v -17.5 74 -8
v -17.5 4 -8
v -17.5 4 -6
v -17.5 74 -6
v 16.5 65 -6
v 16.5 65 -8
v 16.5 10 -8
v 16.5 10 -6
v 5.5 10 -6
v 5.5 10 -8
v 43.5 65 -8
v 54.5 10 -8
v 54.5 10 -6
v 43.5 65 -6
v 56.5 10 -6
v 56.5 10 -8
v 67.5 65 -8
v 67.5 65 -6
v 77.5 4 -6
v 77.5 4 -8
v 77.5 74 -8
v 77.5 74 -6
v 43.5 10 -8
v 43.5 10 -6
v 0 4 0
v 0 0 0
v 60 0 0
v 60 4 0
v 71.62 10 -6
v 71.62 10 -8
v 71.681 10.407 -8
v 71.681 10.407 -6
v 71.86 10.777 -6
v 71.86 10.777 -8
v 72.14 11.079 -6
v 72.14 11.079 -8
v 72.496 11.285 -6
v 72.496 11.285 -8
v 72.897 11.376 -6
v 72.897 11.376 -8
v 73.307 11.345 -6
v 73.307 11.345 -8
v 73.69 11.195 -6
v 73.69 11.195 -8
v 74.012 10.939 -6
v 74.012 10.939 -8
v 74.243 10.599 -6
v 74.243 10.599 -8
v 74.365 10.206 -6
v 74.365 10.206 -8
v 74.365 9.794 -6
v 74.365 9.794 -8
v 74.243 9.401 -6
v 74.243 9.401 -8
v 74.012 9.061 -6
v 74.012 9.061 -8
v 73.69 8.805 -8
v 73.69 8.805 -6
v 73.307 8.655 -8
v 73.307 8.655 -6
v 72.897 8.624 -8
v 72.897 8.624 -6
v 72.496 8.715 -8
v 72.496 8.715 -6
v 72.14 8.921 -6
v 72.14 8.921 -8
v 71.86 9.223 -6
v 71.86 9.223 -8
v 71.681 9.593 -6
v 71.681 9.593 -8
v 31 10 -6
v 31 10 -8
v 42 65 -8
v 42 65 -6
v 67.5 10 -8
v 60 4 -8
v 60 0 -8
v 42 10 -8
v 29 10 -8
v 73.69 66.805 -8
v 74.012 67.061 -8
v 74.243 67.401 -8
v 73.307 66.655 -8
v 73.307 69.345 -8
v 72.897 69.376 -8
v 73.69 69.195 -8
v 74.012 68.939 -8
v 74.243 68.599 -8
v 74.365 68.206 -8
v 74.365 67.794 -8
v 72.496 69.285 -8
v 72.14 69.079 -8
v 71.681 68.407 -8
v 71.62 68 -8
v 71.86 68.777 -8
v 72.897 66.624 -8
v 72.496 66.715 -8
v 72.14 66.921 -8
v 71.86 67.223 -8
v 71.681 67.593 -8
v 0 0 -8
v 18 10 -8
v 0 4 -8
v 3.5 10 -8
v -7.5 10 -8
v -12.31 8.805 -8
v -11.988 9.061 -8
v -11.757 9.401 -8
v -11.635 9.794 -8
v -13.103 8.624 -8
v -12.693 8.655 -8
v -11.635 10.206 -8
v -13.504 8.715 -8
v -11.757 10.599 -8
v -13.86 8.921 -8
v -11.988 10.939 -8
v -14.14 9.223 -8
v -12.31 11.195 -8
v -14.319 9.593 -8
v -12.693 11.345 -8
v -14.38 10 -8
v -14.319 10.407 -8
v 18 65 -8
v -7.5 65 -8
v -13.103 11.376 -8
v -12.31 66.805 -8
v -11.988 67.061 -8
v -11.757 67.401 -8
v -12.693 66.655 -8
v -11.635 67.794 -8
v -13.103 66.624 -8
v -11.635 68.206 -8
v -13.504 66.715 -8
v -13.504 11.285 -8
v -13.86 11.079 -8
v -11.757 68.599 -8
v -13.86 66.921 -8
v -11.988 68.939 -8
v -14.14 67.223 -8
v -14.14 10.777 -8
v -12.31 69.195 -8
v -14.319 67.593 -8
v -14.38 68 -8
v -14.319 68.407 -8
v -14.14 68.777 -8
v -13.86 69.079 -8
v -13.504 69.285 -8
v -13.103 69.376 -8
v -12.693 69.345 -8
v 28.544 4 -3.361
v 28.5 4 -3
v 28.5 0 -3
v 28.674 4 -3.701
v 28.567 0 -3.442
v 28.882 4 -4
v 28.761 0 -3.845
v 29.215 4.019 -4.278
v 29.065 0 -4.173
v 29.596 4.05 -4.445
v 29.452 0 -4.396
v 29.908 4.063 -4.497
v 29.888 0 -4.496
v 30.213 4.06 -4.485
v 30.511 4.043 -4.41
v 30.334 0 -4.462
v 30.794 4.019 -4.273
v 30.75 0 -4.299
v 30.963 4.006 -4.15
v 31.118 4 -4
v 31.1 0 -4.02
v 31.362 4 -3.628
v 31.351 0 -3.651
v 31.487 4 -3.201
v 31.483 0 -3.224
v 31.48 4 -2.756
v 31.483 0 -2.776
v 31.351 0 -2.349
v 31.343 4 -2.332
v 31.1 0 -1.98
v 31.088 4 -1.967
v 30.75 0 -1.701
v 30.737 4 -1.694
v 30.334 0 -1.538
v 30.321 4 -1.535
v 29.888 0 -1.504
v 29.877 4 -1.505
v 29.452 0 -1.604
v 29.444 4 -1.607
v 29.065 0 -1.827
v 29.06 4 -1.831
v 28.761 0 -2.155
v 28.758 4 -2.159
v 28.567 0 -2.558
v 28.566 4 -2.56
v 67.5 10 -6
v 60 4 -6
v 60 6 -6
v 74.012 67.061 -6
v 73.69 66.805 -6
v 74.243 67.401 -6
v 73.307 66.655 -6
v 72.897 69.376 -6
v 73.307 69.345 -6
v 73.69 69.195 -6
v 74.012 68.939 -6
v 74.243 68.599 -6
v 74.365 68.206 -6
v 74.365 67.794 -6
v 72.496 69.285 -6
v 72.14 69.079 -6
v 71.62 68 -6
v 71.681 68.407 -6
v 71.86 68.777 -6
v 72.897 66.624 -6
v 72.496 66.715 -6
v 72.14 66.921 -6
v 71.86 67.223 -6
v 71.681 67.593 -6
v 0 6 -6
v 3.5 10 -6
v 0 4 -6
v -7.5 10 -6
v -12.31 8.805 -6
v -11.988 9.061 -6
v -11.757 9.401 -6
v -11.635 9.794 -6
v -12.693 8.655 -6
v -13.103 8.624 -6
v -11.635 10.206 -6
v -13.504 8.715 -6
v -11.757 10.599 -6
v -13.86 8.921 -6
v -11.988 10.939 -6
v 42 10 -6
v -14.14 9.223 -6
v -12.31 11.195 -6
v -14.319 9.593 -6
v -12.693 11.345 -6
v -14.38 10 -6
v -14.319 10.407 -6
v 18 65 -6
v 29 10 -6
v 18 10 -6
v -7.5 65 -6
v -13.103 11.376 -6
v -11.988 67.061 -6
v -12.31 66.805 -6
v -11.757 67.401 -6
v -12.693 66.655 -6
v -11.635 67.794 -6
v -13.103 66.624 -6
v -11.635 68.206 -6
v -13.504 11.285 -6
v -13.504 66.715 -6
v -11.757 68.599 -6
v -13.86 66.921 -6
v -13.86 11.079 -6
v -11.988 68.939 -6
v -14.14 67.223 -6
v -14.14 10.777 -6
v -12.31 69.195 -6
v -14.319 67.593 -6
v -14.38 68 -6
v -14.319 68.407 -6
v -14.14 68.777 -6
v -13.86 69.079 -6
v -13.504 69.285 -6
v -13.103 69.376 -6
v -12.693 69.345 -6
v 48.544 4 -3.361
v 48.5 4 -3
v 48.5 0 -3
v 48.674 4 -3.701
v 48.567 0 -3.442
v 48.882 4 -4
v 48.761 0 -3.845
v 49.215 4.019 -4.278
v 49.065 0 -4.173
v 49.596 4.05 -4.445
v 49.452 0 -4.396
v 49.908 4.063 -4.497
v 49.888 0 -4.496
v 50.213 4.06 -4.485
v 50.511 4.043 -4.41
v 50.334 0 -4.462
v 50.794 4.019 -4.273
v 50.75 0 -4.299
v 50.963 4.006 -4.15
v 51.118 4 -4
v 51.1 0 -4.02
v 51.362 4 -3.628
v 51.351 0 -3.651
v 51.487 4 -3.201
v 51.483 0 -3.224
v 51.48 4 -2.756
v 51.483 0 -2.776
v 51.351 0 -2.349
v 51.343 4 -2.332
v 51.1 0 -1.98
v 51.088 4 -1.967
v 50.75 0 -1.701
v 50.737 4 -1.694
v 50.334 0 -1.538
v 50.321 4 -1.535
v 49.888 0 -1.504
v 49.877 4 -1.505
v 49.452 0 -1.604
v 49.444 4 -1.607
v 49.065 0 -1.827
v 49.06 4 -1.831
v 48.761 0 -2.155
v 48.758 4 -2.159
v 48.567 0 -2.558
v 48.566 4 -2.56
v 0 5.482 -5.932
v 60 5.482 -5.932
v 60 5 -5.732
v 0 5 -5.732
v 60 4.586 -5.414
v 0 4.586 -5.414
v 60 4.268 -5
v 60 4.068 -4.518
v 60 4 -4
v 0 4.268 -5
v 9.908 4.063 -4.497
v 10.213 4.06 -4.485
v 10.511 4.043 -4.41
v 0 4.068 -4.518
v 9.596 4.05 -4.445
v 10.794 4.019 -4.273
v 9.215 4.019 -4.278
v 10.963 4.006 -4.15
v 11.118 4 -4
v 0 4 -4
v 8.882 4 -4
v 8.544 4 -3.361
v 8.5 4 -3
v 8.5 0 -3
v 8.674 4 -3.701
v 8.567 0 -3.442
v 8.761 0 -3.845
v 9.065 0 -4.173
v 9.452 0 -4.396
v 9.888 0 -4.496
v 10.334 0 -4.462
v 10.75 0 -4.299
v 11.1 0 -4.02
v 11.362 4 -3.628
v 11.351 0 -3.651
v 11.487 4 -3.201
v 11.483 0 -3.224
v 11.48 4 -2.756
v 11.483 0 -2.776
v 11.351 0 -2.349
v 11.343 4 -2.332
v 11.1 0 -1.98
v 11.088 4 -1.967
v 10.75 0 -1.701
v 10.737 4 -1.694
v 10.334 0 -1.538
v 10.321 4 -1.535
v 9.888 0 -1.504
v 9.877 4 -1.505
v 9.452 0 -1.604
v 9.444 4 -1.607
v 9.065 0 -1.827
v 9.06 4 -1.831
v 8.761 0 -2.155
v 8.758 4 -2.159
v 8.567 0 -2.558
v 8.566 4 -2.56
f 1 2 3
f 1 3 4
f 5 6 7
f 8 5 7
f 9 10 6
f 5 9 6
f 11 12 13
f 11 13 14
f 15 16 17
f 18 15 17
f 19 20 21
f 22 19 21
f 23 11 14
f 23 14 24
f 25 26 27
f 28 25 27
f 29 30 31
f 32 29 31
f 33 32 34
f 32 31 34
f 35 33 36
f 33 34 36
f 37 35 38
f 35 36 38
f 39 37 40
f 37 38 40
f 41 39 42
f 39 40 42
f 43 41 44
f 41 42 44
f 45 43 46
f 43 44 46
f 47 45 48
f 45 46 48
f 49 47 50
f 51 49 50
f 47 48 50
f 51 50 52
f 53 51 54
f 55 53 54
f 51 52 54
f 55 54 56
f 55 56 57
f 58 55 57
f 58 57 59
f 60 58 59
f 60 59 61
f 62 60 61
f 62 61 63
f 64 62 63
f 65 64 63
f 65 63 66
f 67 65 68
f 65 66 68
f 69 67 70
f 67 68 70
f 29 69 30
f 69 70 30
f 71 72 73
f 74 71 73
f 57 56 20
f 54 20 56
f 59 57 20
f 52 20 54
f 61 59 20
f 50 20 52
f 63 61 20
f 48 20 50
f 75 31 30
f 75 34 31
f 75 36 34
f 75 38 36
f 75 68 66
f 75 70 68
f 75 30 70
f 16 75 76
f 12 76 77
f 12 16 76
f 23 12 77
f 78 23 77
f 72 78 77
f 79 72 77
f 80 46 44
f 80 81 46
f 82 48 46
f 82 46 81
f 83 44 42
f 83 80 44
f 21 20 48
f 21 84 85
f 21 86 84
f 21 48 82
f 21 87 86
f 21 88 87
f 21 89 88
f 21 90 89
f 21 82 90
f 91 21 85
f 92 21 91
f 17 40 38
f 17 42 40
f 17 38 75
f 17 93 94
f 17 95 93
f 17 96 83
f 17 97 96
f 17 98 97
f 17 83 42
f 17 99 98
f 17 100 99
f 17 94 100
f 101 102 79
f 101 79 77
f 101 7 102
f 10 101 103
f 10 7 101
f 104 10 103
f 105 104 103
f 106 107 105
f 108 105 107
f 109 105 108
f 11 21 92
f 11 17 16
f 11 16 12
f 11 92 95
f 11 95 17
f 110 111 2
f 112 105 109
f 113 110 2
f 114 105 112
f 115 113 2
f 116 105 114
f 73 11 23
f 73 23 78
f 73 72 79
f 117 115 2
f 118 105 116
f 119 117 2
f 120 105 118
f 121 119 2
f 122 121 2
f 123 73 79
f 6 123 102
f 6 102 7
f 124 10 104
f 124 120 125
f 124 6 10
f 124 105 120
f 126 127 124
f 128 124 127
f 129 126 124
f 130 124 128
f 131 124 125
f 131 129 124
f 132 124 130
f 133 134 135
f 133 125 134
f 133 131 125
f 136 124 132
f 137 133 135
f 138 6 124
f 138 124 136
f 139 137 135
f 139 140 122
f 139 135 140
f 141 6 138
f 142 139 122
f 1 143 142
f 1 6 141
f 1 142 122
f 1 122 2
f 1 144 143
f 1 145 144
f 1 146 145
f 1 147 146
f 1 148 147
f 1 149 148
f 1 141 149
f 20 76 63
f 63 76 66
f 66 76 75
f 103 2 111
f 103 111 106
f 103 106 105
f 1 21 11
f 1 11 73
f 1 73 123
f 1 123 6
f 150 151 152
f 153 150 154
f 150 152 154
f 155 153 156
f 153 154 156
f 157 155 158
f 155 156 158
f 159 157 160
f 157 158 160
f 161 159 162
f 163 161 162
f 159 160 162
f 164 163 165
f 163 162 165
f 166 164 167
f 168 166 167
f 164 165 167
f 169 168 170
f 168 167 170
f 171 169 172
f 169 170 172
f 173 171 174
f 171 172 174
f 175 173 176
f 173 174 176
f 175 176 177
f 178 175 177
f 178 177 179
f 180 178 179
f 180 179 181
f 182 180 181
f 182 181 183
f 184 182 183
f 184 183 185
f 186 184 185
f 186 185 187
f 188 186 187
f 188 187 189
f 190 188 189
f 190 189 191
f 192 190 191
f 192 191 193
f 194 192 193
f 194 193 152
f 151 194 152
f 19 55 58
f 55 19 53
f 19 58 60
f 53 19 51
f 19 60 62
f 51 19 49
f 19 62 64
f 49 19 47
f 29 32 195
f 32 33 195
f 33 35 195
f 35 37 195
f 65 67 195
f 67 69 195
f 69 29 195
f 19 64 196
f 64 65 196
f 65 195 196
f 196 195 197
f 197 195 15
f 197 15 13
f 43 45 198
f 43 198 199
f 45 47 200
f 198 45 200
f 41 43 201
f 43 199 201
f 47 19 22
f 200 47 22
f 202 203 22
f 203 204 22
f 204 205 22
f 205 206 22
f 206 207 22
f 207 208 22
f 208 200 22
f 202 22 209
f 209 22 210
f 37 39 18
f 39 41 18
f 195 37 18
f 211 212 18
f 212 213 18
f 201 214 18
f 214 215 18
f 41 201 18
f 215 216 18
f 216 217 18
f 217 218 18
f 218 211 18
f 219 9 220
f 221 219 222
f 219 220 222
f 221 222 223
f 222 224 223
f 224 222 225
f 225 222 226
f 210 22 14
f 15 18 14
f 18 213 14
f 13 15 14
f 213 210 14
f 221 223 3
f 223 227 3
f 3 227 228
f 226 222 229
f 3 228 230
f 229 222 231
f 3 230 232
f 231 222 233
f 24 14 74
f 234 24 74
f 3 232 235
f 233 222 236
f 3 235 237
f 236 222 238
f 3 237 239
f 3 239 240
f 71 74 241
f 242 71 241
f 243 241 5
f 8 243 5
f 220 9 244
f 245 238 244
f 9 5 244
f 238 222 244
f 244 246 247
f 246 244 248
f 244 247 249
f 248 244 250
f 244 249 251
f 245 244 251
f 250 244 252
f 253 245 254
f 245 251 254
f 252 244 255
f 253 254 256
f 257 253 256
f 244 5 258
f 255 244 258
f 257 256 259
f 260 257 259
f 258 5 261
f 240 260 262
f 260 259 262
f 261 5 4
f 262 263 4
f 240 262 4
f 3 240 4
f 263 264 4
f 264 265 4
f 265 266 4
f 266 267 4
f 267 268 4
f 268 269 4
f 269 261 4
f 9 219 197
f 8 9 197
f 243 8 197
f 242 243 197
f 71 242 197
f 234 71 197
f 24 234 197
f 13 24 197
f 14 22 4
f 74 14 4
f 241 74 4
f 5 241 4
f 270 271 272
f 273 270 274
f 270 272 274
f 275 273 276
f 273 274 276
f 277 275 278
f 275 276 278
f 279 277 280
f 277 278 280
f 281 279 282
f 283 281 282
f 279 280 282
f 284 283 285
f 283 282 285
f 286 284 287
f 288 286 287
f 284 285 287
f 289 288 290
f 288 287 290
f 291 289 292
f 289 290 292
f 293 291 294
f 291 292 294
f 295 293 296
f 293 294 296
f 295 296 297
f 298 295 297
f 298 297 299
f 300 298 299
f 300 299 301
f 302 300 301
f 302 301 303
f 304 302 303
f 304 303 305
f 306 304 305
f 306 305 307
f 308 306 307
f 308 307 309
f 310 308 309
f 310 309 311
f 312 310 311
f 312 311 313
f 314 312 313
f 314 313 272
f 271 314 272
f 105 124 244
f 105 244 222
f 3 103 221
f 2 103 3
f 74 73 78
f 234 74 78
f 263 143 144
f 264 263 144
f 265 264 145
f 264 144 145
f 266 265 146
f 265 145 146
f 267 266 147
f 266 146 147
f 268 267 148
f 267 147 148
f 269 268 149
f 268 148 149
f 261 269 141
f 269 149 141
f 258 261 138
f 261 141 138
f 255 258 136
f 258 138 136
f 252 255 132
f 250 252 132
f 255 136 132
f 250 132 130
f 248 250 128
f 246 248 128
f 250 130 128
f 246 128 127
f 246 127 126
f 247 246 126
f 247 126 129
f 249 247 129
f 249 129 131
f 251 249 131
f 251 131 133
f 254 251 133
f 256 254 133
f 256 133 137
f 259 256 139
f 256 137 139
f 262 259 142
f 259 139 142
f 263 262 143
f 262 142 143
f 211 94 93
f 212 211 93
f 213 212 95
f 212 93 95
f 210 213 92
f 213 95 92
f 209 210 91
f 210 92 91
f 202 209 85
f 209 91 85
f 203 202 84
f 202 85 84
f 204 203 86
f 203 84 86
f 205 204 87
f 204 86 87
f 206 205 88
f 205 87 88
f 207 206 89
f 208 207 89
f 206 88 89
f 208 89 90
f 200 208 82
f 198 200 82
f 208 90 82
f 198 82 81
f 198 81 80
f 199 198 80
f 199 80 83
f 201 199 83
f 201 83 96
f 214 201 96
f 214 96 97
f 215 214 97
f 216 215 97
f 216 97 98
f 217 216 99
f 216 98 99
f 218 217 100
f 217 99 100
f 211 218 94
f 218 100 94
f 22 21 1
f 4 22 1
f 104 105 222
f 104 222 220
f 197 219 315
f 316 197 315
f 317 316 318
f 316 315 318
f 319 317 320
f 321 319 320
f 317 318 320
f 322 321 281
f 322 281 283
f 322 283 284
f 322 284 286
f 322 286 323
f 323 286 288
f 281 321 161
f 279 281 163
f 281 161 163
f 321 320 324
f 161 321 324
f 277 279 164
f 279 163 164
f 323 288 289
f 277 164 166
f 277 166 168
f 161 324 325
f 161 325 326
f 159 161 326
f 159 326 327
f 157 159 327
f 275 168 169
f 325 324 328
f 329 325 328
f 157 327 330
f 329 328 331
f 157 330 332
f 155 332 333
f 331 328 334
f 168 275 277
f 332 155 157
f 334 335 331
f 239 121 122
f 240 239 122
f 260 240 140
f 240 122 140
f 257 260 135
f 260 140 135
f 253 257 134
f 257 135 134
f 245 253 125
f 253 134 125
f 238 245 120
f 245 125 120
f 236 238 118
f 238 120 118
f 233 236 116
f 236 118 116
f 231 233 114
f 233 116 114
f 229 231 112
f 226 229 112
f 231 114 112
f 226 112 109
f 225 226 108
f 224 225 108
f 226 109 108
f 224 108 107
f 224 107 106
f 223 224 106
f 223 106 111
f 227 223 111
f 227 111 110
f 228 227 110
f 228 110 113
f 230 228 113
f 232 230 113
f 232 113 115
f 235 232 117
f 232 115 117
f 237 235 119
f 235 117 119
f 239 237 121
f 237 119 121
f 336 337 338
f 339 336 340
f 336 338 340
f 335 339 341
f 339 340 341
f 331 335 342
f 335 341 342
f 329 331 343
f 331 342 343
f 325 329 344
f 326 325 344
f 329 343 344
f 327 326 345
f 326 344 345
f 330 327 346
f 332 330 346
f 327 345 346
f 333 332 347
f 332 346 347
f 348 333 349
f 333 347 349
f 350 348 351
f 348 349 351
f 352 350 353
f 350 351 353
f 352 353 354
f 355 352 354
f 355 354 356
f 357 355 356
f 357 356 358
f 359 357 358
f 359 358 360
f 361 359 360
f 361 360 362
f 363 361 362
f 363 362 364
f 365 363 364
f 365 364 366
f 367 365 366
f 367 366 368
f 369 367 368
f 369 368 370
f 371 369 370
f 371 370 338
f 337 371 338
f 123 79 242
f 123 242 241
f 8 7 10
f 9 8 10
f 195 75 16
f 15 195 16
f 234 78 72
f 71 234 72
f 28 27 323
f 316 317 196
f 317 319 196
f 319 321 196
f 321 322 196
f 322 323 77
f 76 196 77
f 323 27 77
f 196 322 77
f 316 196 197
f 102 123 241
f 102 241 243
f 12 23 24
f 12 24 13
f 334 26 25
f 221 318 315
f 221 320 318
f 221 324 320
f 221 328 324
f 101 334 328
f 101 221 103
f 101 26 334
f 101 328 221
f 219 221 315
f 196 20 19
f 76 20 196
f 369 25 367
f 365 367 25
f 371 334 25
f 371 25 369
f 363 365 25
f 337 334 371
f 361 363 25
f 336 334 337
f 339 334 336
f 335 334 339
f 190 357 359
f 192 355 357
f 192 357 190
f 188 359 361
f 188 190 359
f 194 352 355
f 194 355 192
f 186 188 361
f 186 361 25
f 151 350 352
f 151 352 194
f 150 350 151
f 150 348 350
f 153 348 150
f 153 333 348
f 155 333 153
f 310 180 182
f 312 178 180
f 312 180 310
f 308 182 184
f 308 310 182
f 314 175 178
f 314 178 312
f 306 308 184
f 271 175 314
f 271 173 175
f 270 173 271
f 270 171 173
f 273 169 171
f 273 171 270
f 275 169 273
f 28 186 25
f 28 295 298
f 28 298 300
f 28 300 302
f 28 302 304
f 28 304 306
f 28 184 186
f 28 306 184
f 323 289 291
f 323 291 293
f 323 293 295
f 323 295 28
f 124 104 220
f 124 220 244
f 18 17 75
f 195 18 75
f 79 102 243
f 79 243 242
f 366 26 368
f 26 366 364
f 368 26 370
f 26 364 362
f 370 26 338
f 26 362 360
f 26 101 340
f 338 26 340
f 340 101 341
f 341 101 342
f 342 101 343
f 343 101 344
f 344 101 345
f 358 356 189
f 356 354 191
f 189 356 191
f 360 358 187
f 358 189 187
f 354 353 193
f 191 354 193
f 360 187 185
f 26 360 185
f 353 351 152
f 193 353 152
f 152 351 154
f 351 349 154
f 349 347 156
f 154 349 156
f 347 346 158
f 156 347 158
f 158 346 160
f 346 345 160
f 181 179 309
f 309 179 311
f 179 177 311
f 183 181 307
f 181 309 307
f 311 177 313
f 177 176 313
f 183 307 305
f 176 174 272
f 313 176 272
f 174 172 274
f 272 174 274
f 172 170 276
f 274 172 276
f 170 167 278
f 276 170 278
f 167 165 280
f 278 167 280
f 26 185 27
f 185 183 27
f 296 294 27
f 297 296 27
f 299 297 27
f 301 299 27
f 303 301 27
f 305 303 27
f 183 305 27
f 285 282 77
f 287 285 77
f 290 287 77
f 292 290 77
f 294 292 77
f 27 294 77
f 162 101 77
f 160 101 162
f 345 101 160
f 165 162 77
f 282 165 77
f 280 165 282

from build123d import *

# Parameters (mm, degrees)
SKETCH1_W             = 60
SKETCH1_H             = 8
BOSS_EXTRUDE1_DEPTH   = 4
SKETCH3_W             = 95
SKETCH3_H             = 70
SKETCH3_R             = 1.38
BOSS_EXTRUDE2_DEPTH   = 2
FILLET3_R             = 2
F_3_0MM_DOWEL_HOLE2_D = 3


with BuildPart() as part:
    # Sketch1 → Boss-Extrude1 (new body)
    with BuildSketch(Plane(origin=(0, 0, 0), x_dir=(1, 0, 0), z_dir=(0, 1, 0))):
        with Locations((30, 4)):
            Rectangle(SKETCH1_W, SKETCH1_H)
    extrude(amount=BOSS_EXTRUDE1_DEPTH)

    # Sketch3 → Boss-Extrude2 (add)
    with BuildSketch(Plane(origin=(0, 0, -8), x_dir=(-1, 0, 0), z_dir=(0, 0, -1))):
        with Locations((-30, 39)):
            Rectangle(SKETCH3_W, SKETCH3_H)
        with Locations((13, 68)):
            Circle(SKETCH3_R, mode=Mode.SUBTRACT)
        with Locations((-73, 68)):
            Circle(SKETCH3_R, mode=Mode.SUBTRACT)
        with Locations((-73, 10)):
            Circle(SKETCH3_R, mode=Mode.SUBTRACT)
        with Locations((13, 10)):
            Circle(SKETCH3_R, mode=Mode.SUBTRACT)
        Polygon((-3.5, 10), (7.5, 65), (7.5, 10), align=None, mode=Mode.SUBTRACT)
        Polygon((-16.5, 10), (-5.5, 10), (-16.5, 65), align=None, mode=Mode.SUBTRACT)
        Polygon((-18, 10), (-29, 10), (-18, 65), align=None, mode=Mode.SUBTRACT)
        Polygon((-42, 10), (-31, 10), (-42, 65), align=None, mode=Mode.SUBTRACT)
        Polygon((-43.5, 10), (-54.5, 10), (-43.5, 65), align=None, mode=Mode.SUBTRACT)
        Polygon((-67.5, 10), (-56.5, 10), (-67.5, 65), align=None, mode=Mode.SUBTRACT)
    extrude(amount=-BOSS_EXTRUDE2_DEPTH)

    # Fillet3
    fillet3_edges = [part.edges().sort_by_distance(p)[0] for p in [
        (30, 4, -6),
    ]]
    fillet(fillet3_edges, radius=FILLET3_R)

    # Ø3.0mm Dowel Hole2 (through all)
    with Locations(Plane(origin=(0, 74, 0), x_dir=(1, 0, 0), z_dir=(0, 1, 0))):
        with Locations((10, 3), (30, 3), (50, 3)):
            Hole(F_3_0MM_DOWEL_HOLE2_D / 2)


solid = part.part
